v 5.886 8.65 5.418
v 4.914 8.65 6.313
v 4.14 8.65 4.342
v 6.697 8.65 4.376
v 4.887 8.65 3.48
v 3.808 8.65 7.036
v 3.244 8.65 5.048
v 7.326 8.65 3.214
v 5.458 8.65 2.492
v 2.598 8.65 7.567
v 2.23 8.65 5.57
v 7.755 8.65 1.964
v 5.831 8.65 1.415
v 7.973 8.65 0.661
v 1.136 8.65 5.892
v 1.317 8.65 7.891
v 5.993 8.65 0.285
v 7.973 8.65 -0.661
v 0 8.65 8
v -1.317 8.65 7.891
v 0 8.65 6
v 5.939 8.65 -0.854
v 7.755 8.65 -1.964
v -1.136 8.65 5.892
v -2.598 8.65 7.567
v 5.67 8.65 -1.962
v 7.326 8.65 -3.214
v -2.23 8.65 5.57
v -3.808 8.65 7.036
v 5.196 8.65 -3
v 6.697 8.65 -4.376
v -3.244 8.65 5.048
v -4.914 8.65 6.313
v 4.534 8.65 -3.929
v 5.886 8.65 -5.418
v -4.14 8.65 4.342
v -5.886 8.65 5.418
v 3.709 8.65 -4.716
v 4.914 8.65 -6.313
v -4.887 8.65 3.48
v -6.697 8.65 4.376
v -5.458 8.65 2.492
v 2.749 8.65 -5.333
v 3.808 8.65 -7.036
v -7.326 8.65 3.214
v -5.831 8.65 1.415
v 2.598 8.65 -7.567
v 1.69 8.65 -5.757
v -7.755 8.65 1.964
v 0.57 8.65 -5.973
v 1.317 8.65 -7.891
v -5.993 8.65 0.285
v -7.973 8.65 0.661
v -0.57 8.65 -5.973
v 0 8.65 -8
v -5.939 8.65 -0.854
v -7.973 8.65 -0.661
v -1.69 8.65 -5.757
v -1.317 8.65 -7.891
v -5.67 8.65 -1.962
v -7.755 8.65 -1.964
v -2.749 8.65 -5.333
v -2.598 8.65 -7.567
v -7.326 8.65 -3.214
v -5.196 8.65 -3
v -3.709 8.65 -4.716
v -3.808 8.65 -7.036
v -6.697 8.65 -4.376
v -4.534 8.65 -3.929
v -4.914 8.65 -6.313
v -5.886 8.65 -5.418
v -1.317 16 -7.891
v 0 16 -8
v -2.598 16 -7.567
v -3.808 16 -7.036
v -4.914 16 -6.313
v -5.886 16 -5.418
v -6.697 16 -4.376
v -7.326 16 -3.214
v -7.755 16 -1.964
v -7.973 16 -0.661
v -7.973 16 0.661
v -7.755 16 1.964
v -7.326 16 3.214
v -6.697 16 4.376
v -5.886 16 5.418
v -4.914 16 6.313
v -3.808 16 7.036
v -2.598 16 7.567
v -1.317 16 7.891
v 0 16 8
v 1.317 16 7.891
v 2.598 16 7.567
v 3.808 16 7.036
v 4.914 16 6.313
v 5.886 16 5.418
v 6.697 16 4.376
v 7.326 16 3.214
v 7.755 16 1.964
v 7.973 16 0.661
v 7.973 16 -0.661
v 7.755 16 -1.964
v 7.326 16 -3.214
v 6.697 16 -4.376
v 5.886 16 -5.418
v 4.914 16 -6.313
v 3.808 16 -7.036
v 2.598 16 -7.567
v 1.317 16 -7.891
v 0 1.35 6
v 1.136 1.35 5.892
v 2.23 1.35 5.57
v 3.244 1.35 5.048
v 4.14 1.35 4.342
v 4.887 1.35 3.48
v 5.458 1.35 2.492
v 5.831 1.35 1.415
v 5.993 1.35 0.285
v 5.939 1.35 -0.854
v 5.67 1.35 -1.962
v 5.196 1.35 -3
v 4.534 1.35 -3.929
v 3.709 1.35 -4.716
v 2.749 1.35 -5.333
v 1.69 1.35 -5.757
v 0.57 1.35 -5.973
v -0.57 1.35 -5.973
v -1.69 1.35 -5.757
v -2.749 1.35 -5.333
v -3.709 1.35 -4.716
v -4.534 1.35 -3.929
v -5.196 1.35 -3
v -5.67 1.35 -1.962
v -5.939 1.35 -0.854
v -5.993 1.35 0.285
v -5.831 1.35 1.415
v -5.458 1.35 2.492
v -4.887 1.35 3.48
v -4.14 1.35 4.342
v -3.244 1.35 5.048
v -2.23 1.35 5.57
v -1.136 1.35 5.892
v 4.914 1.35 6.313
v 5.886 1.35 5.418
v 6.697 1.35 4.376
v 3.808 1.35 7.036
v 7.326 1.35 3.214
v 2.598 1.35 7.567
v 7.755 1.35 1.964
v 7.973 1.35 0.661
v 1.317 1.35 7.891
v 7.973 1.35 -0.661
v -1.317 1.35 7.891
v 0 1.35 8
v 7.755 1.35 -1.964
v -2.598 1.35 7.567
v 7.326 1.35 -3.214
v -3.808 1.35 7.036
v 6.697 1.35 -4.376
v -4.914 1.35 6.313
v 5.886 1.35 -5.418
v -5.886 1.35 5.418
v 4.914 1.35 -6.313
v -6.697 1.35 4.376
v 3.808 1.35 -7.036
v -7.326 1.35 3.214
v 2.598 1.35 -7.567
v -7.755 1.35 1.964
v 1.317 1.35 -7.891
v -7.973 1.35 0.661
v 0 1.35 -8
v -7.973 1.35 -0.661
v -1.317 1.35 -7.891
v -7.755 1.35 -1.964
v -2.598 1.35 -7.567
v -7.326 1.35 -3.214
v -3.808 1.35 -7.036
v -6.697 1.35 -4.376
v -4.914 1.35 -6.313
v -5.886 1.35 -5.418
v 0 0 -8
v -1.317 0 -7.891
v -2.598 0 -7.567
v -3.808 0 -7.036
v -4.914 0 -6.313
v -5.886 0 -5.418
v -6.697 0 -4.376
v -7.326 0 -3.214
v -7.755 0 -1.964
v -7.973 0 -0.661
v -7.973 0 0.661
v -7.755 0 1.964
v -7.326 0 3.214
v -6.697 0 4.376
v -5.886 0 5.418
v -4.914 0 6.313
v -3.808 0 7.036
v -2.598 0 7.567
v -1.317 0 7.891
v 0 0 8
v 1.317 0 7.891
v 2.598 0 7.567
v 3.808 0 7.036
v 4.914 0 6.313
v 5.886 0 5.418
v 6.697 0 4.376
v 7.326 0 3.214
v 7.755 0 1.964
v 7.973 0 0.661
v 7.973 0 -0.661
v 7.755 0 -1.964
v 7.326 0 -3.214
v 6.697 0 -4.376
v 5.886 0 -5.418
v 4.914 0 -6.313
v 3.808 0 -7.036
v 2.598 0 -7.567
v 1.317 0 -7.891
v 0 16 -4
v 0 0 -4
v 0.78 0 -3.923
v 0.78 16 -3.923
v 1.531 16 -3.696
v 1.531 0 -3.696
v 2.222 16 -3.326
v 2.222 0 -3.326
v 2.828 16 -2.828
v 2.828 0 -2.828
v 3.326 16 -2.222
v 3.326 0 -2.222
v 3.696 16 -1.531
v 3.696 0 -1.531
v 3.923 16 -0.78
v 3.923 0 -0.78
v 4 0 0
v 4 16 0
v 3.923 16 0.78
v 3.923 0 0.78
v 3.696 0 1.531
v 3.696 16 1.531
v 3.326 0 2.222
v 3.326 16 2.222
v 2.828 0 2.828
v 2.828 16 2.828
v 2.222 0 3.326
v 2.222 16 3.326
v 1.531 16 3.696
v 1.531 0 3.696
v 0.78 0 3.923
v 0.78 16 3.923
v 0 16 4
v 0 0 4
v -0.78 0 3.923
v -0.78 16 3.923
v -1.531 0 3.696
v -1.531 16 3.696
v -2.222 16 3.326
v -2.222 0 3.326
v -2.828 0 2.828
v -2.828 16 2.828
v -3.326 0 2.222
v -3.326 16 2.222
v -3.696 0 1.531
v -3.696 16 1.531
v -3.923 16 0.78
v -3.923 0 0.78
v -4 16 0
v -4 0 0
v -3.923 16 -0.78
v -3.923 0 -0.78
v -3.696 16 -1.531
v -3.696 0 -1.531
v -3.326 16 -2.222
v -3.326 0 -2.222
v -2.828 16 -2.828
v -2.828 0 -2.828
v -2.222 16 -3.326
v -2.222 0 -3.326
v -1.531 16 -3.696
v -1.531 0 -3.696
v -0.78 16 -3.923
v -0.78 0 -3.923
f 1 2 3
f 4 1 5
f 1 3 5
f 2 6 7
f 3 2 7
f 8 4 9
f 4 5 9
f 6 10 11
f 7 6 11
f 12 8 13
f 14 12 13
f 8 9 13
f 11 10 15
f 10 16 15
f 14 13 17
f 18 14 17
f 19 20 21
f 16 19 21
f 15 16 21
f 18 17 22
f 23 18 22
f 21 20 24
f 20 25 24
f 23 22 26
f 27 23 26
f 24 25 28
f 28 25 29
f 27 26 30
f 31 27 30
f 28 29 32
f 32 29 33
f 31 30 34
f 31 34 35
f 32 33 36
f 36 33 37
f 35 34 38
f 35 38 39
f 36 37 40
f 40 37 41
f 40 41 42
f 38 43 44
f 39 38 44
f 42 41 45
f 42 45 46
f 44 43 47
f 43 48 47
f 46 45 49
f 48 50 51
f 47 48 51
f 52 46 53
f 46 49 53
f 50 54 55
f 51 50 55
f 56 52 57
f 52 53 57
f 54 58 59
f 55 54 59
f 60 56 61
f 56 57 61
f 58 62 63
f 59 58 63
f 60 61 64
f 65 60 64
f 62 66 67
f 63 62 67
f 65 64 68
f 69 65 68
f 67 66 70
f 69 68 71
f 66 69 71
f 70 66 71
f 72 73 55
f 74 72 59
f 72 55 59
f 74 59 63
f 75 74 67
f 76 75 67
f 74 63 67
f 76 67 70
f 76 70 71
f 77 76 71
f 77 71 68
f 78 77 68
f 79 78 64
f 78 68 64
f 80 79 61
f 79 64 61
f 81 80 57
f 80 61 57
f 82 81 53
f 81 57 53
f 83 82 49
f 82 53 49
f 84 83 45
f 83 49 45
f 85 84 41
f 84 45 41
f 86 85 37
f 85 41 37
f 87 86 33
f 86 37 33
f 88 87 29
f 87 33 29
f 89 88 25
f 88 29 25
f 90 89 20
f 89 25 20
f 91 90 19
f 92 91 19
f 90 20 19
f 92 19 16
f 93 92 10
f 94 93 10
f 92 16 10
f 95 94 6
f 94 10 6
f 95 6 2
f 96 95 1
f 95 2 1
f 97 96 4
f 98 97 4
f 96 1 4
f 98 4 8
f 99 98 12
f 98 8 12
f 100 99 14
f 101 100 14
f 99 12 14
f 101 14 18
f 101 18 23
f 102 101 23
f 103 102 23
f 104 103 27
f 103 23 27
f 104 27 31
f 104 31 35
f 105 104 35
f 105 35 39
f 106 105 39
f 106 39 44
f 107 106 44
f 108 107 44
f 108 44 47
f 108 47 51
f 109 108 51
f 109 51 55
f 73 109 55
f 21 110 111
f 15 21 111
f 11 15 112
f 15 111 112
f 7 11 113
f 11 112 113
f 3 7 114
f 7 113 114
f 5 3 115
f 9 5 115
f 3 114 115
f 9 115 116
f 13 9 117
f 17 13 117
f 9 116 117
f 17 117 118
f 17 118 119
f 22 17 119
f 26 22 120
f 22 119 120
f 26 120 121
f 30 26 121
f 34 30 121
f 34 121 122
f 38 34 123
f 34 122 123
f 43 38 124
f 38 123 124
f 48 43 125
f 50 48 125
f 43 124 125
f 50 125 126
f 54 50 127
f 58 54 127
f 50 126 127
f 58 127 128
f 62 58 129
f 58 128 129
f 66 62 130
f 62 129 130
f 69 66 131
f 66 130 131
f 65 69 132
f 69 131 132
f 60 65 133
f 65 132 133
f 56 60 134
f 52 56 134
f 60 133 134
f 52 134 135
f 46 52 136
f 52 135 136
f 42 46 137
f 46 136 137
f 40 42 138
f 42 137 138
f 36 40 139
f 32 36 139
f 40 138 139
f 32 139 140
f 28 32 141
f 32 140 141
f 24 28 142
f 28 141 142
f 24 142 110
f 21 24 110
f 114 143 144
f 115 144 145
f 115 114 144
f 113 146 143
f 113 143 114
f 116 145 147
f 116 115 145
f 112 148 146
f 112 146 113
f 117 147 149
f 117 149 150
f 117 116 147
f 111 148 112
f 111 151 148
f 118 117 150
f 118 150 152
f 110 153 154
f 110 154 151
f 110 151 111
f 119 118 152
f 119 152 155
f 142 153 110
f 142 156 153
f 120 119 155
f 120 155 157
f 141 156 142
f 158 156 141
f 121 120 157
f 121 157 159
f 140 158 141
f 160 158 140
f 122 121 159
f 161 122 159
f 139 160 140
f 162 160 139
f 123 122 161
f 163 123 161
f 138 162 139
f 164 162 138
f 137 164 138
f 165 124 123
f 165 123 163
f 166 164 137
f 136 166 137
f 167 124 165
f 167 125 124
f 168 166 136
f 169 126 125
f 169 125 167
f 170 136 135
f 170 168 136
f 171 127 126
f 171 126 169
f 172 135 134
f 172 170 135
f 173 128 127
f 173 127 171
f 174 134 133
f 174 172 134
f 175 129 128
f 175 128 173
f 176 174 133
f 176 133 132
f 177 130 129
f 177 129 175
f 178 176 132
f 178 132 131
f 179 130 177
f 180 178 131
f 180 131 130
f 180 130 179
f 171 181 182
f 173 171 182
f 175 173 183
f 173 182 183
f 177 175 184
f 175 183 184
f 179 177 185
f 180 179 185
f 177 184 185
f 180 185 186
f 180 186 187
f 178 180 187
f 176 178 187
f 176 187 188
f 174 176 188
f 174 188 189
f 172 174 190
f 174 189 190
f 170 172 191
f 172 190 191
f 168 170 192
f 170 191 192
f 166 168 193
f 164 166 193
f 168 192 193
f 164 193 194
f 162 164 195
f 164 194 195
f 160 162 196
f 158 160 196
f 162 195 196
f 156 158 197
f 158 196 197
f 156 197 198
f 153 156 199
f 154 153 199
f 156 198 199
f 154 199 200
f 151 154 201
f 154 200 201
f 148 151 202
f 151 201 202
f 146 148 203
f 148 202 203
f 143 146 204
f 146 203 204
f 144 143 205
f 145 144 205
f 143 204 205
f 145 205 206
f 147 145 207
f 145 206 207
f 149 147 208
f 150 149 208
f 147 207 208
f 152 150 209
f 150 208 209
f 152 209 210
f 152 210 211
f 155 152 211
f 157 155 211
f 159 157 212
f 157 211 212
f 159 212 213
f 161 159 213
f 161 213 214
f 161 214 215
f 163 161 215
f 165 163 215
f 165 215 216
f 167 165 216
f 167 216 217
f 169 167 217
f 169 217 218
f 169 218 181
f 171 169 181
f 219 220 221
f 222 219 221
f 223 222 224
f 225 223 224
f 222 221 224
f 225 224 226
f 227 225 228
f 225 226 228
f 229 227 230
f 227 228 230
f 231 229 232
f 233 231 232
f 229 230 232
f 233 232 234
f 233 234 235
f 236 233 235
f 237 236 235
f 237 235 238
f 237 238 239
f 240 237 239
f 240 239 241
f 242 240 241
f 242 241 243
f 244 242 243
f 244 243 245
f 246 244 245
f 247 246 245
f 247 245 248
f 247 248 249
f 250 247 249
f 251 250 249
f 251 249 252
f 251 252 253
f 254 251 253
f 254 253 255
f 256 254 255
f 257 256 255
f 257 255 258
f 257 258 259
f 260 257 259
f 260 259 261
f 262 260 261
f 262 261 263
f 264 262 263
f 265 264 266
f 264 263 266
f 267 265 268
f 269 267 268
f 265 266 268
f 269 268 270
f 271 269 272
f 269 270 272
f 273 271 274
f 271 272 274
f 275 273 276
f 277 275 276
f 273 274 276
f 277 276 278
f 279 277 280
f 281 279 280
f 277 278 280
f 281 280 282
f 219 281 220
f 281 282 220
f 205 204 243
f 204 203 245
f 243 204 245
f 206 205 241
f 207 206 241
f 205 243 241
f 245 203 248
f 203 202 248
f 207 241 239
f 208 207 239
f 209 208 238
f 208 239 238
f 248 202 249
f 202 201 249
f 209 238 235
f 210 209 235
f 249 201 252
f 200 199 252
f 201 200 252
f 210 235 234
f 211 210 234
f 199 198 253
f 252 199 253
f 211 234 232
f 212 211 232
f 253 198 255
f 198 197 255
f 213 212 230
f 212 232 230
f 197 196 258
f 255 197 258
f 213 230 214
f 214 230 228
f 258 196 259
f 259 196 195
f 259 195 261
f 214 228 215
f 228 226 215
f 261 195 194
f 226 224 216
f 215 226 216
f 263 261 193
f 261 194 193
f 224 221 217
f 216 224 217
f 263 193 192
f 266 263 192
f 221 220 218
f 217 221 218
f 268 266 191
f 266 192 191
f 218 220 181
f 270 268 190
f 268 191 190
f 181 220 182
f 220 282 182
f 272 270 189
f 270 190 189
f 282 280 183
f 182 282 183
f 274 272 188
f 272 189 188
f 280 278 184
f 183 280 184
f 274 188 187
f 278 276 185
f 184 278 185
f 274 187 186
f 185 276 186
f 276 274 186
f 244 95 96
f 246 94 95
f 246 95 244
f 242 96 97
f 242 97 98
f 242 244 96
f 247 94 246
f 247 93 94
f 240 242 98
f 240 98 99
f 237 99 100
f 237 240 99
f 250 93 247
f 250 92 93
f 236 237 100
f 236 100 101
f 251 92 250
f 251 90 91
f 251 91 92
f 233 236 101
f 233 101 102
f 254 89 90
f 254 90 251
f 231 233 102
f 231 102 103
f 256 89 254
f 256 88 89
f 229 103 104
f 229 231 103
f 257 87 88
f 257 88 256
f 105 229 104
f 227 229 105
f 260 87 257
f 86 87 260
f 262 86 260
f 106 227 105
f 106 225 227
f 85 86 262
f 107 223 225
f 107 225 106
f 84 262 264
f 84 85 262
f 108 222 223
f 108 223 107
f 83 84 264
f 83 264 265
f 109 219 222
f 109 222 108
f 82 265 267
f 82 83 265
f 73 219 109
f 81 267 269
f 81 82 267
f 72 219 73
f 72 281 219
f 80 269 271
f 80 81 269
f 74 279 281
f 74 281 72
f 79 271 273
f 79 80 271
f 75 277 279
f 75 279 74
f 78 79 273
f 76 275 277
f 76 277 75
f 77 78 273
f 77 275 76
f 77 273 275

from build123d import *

# Parameters (mm, degrees)
SKETCH_1_R          = 8
EXTRUDE_1_DEPTH     = 1.35
SKETCH_4_R          = 6
EXTRUDE_3_DEPTH     = 7.3
EXTRUDE_START       = 8.65
SKETCH_1_3_R        = 8
EXTRUDE_4_DEPTH     = 7.35
SKETCH_5_R          = 4
CUT_EXTRUDE_1_DEPTH = 20.595917942


with BuildPart() as part:
    # 草图1 → 凸台-拉伸1 (new body)
    with BuildSketch(Plane(origin=(0, 0, 0), x_dir=(1, 0, 0), z_dir=(0, 1, 0))):
        with Locations(Location((0, 0, 0), (0, 0, 90))):
            Circle(SKETCH_1_R)
    extrude(amount=EXTRUDE_1_DEPTH)

    # 草图4 → 凸台-拉伸3 (add)
    with BuildSketch(Plane(origin=(0, 1.35, 0), x_dir=(1, 0, 0), z_dir=(0, 1, 0))):
        with Locations(Location((0, 0, 0), (0, 0, 270))):
            Circle(SKETCH_4_R)
    extrude(amount=EXTRUDE_3_DEPTH)

    # 草图1<3> → 凸台-拉伸4 (add)
    with BuildSketch(Plane(origin=(0, 0, 0), x_dir=(1, 0, 0), z_dir=(0, 1, 0)).offset(EXTRUDE_START)):
        with Locations(Location((0, 0, 0), (0, 0, 90))):
            Circle(SKETCH_1_3_R)
    extrude(amount=EXTRUDE_4_DEPTH)

    # 草图5 → 切除-拉伸1 (cut, through all)
    with BuildSketch(Plane.XZ):
        with Locations(Location((0, 0, 0), (0, 0, 270))):
            Circle(SKETCH_5_R)
    extrude(amount=-CUT_EXTRUDE_1_DEPTH, mode=Mode.SUBTRACT)


solid = part.part
